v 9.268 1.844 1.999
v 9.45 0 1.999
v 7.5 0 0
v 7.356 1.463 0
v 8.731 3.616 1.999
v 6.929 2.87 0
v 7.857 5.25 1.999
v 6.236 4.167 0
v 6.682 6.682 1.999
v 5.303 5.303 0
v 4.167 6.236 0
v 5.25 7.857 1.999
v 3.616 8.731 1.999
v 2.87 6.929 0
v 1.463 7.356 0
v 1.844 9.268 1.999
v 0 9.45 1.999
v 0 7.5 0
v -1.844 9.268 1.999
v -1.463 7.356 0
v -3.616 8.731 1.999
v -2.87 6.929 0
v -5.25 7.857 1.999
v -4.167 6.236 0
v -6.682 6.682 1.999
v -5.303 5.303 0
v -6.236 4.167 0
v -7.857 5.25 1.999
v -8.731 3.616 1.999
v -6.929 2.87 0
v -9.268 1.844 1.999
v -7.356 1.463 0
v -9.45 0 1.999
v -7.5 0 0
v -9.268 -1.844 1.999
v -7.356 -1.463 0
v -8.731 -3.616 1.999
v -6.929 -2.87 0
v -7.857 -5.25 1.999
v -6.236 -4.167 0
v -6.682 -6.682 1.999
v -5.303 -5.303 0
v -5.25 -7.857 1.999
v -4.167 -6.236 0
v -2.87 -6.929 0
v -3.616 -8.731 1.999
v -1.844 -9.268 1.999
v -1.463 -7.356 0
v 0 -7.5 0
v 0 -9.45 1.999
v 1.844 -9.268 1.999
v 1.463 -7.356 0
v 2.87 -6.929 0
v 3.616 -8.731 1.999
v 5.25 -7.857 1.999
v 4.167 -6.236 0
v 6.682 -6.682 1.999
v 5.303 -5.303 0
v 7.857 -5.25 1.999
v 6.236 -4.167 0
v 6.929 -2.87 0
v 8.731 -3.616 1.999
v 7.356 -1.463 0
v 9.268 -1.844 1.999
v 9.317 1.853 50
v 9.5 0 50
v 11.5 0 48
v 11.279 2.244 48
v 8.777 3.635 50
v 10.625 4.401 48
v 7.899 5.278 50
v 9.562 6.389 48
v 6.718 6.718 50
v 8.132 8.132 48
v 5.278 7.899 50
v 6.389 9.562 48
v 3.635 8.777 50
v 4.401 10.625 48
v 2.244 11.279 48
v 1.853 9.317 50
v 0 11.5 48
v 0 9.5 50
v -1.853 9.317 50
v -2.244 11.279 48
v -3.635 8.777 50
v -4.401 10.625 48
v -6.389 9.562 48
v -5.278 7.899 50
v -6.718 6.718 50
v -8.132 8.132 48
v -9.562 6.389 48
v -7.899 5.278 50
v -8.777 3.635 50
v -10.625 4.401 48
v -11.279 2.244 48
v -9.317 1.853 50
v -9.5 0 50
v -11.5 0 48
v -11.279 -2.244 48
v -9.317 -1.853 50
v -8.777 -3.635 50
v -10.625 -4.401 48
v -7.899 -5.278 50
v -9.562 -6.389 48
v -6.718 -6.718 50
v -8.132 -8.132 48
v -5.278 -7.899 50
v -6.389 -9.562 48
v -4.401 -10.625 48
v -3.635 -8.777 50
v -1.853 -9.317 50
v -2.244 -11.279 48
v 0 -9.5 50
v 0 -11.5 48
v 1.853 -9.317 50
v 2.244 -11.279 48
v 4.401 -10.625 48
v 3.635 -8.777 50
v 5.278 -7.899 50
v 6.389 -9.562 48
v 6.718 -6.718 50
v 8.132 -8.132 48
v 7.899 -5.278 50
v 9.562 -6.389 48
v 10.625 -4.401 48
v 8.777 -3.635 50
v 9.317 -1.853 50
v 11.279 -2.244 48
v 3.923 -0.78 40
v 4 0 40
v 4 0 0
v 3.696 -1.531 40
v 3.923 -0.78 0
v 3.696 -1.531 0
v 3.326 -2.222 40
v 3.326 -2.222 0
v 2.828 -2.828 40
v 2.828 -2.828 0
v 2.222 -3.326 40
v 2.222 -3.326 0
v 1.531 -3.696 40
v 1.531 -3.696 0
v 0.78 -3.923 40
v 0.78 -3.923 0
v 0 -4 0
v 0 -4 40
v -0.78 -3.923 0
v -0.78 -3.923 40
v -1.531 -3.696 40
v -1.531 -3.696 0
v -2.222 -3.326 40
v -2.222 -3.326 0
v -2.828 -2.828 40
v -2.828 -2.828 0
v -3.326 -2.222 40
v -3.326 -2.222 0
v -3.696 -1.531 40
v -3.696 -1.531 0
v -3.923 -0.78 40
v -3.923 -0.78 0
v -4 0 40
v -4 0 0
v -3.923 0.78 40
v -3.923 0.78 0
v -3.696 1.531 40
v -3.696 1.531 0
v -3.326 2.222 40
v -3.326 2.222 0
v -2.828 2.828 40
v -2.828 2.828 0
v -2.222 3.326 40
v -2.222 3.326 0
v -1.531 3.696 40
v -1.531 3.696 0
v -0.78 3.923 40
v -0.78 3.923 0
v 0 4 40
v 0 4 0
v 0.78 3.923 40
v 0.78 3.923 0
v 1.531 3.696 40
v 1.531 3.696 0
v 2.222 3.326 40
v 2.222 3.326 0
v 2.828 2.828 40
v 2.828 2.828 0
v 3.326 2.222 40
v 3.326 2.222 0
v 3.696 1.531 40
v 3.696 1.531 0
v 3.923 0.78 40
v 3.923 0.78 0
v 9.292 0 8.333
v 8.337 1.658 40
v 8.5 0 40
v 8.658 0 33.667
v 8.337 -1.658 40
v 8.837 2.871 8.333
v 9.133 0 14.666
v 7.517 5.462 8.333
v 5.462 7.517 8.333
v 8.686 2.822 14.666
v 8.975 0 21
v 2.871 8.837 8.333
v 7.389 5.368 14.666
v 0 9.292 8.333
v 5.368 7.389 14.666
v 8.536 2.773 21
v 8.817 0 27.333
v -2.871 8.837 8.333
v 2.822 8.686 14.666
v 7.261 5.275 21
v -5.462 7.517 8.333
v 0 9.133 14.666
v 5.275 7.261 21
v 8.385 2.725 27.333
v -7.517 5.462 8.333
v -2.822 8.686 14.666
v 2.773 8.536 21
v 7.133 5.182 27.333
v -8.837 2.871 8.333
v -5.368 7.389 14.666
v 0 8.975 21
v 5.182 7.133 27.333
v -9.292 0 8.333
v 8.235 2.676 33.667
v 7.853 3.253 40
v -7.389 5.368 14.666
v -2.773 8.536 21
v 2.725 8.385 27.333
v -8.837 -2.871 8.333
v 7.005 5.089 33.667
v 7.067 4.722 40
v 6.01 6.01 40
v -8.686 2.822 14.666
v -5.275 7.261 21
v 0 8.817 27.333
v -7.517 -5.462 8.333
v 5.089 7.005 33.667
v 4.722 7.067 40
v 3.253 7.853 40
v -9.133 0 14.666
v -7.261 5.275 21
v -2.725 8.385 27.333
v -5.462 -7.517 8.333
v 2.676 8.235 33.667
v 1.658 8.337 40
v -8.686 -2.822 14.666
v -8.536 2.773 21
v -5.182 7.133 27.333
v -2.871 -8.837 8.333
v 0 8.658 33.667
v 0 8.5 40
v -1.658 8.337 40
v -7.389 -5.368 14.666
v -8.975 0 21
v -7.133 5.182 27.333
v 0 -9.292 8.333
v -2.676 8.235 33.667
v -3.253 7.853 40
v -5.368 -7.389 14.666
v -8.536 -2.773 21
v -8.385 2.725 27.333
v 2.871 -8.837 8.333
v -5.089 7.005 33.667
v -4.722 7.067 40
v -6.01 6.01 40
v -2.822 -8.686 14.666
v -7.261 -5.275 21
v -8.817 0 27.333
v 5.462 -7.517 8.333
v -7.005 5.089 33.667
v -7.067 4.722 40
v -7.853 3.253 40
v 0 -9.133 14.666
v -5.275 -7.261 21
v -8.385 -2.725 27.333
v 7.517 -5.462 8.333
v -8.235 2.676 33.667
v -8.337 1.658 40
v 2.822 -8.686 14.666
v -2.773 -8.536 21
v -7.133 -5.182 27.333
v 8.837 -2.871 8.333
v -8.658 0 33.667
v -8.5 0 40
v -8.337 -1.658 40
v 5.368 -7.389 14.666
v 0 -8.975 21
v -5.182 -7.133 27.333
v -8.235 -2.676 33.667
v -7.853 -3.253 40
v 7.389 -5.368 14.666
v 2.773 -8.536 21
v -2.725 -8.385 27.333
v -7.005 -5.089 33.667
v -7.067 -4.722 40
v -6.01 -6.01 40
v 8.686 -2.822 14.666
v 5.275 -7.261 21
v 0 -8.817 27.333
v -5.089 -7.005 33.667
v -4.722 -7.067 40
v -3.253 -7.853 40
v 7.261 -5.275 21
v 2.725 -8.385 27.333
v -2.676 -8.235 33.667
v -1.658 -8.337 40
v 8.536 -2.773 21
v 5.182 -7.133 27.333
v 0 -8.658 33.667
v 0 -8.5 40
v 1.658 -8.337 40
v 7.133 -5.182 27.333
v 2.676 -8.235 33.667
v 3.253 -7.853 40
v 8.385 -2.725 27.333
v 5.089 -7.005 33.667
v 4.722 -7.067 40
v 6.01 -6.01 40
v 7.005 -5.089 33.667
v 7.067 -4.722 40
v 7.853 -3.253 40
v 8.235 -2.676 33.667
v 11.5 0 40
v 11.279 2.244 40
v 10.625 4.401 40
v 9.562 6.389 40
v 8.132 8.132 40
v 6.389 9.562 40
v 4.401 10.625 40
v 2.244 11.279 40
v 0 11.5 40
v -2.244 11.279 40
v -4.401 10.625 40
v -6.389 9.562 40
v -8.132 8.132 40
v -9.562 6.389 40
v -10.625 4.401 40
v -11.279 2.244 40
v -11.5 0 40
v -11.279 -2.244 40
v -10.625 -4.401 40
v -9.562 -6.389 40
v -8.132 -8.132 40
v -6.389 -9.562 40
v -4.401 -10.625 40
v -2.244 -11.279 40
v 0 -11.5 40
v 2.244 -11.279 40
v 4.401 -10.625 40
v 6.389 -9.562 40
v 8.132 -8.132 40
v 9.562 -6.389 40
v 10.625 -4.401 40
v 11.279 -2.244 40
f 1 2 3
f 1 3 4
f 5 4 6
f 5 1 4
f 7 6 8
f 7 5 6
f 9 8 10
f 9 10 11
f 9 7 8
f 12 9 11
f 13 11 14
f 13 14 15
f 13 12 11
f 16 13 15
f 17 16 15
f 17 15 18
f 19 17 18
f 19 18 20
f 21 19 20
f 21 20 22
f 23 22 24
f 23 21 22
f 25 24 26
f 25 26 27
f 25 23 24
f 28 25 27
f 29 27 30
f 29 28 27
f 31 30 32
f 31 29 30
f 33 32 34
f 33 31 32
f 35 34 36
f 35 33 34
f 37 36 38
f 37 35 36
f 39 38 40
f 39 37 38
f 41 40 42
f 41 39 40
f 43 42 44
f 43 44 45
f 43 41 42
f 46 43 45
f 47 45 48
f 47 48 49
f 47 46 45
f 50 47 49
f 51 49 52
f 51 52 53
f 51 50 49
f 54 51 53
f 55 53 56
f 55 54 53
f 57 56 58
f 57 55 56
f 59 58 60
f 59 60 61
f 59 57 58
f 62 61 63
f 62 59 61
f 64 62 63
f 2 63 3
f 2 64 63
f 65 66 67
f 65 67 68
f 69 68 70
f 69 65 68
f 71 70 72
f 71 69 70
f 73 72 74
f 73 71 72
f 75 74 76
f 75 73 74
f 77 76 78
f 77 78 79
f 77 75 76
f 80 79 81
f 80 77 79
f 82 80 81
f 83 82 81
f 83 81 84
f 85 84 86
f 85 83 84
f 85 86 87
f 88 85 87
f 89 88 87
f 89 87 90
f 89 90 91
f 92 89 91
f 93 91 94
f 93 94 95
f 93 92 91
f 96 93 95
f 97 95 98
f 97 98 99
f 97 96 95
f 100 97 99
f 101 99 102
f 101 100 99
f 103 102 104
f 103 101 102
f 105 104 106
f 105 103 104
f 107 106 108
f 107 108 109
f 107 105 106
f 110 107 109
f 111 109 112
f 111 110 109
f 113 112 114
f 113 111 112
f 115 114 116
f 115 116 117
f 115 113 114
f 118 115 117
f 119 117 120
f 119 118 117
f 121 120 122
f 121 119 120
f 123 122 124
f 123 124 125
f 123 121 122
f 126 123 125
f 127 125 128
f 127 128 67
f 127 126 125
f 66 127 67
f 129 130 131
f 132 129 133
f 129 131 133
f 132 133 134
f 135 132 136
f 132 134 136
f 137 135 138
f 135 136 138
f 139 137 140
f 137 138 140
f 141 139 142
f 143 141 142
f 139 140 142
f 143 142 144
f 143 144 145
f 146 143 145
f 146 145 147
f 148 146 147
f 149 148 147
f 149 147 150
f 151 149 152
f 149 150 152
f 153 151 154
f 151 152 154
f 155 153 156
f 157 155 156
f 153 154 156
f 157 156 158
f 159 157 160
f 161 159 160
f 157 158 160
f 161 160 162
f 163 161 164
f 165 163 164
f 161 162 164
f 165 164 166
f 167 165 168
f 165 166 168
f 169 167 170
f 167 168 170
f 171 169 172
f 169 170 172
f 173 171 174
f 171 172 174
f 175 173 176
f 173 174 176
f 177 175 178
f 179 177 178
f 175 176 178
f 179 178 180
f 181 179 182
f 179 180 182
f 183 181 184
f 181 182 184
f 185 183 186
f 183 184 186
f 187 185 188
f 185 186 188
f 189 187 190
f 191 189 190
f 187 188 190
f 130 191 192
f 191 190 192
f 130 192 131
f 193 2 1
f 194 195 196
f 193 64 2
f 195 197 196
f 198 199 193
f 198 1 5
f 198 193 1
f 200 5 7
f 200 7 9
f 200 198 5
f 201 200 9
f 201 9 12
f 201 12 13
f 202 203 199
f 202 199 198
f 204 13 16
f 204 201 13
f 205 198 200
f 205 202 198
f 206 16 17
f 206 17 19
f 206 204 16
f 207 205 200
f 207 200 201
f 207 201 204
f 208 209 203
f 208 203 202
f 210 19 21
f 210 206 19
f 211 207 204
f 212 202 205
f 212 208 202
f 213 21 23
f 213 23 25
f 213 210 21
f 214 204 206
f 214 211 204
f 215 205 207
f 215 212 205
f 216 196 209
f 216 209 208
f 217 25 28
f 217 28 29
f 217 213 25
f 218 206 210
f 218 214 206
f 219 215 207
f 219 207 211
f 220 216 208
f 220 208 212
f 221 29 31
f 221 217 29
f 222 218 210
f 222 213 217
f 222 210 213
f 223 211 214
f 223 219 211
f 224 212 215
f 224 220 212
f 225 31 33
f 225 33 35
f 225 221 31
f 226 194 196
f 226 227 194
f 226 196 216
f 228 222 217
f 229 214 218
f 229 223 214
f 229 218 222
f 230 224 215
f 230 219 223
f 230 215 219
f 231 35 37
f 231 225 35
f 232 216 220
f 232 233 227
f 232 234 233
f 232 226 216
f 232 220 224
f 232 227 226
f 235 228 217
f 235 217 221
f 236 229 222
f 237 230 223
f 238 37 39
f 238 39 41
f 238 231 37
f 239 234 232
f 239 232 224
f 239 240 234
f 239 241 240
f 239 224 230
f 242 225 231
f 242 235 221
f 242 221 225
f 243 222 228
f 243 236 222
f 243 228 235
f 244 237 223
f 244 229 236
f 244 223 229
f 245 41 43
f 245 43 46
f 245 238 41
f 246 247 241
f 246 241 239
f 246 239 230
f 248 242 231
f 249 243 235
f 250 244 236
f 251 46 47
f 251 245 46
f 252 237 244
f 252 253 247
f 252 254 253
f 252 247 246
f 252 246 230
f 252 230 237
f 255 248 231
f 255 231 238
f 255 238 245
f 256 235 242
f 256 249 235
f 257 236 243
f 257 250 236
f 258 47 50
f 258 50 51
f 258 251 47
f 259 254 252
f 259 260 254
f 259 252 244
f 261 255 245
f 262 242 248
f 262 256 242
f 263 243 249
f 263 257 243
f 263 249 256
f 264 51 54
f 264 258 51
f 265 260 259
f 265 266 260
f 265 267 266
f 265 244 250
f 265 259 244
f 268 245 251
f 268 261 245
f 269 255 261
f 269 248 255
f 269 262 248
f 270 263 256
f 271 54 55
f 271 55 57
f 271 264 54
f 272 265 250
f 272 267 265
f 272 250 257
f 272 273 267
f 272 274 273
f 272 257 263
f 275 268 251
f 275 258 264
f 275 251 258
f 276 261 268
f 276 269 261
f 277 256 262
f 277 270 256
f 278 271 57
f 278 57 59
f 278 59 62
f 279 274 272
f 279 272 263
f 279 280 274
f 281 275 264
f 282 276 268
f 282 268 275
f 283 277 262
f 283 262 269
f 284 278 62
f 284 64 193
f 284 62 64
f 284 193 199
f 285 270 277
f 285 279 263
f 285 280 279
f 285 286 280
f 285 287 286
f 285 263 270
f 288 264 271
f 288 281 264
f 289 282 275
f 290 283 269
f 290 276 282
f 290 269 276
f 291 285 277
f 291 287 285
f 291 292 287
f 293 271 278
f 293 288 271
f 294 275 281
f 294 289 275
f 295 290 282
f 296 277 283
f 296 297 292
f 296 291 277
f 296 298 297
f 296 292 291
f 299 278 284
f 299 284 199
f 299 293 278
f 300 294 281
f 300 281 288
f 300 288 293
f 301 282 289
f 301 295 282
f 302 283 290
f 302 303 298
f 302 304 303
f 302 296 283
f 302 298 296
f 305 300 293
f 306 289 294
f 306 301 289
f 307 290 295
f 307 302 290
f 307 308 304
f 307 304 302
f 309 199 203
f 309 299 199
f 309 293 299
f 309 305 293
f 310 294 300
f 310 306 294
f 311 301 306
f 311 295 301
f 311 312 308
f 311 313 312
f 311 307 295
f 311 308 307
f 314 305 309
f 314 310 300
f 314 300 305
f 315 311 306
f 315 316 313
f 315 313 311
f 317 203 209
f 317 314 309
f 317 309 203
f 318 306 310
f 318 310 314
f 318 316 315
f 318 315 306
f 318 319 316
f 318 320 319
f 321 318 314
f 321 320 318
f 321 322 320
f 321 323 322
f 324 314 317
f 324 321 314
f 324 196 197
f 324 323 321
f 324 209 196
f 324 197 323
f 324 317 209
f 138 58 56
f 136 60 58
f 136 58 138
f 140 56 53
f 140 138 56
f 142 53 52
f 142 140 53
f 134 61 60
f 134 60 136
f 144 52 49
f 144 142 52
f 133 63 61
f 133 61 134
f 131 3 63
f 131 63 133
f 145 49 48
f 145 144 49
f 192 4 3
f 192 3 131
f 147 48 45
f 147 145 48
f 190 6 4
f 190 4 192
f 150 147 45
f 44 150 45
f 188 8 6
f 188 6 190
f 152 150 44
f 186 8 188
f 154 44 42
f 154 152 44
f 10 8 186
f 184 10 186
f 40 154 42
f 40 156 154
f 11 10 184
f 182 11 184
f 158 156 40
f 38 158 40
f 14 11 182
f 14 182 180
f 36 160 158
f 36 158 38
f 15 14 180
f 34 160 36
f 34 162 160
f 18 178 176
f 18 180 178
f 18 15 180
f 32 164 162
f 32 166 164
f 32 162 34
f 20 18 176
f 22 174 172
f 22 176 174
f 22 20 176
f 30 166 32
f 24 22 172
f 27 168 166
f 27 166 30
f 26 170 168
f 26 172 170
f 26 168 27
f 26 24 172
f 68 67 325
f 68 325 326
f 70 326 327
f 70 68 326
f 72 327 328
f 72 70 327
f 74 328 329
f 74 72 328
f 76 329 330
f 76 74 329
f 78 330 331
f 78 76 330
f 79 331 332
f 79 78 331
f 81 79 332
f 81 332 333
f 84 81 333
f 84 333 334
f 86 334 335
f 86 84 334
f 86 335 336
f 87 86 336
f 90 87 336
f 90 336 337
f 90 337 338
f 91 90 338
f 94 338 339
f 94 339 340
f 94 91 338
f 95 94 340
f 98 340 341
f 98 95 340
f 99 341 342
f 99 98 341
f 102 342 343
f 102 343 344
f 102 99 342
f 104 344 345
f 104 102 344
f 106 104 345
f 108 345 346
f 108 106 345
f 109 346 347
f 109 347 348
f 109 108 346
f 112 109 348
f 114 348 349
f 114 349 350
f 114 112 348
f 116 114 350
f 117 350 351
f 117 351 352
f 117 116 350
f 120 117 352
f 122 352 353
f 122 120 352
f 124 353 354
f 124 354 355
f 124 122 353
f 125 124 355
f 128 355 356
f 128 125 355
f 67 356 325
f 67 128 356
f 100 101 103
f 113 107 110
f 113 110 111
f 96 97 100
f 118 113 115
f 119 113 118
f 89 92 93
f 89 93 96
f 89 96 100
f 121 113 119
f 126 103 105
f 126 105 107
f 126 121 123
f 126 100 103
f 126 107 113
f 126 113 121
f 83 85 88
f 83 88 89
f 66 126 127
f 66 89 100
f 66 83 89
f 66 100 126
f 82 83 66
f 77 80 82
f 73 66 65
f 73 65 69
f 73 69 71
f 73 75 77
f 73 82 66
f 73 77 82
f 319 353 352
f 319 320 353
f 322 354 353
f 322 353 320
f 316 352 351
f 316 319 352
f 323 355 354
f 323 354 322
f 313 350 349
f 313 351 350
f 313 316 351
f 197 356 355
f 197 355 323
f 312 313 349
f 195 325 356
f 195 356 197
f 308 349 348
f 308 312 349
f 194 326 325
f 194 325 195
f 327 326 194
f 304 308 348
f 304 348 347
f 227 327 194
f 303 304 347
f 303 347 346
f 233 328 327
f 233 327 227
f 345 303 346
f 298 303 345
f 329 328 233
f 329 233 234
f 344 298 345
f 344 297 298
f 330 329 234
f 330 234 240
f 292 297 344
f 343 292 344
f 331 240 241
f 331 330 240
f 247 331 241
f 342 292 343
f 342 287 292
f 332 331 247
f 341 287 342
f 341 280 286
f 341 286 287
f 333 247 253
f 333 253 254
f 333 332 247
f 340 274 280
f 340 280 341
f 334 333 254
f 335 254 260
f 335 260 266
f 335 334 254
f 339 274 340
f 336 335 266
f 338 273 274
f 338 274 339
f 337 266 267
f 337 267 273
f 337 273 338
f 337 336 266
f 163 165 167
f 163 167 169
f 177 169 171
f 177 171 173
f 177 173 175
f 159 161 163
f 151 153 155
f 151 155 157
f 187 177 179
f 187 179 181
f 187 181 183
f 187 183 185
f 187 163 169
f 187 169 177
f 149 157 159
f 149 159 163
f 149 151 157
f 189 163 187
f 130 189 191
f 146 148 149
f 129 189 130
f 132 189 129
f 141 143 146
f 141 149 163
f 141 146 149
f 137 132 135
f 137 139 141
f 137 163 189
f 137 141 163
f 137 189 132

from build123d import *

# Parameters (mm, degrees)
F2_SIZE  = 2
F3_SIZE  = 2
F4_R     = 4
F5_DEPTH = 40


with BuildPart() as f1:
    # F0 (on Front) → F1 (revolve)
    with BuildSketch(Plane.XZ):
        Polygon((0, 40), (0, 0), (9.5, 0), (8.5, 40), (11.5, 40), (11.5, 50), (8.5, 50), (0, 50), align=None)
    revolve(axis=Axis((0, 0, 45), (0, 0, 1)))

    # F2
    f2_edges = [f1.edges().sort_by_distance(p)[0] for p in [
        (-9.5, 0, 0),
    ]]
    chamfer(f2_edges, length=F2_SIZE)

    # F3
    f3_edges = [f1.edges().sort_by_distance(p)[0] for p in [
        (-11.5, 0, 50),
    ]]
    chamfer(f3_edges, length=F3_SIZE)

    # F4 (on face) → F5 (cut, through all)
    with BuildSketch(Plane(origin=(0, 0, 0), x_dir=(1, 0, 0), z_dir=(0, 0, -1))):
        Circle(F4_R)
    extrude(amount=-F5_DEPTH, mode=Mode.SUBTRACT)


solid = f1.part
